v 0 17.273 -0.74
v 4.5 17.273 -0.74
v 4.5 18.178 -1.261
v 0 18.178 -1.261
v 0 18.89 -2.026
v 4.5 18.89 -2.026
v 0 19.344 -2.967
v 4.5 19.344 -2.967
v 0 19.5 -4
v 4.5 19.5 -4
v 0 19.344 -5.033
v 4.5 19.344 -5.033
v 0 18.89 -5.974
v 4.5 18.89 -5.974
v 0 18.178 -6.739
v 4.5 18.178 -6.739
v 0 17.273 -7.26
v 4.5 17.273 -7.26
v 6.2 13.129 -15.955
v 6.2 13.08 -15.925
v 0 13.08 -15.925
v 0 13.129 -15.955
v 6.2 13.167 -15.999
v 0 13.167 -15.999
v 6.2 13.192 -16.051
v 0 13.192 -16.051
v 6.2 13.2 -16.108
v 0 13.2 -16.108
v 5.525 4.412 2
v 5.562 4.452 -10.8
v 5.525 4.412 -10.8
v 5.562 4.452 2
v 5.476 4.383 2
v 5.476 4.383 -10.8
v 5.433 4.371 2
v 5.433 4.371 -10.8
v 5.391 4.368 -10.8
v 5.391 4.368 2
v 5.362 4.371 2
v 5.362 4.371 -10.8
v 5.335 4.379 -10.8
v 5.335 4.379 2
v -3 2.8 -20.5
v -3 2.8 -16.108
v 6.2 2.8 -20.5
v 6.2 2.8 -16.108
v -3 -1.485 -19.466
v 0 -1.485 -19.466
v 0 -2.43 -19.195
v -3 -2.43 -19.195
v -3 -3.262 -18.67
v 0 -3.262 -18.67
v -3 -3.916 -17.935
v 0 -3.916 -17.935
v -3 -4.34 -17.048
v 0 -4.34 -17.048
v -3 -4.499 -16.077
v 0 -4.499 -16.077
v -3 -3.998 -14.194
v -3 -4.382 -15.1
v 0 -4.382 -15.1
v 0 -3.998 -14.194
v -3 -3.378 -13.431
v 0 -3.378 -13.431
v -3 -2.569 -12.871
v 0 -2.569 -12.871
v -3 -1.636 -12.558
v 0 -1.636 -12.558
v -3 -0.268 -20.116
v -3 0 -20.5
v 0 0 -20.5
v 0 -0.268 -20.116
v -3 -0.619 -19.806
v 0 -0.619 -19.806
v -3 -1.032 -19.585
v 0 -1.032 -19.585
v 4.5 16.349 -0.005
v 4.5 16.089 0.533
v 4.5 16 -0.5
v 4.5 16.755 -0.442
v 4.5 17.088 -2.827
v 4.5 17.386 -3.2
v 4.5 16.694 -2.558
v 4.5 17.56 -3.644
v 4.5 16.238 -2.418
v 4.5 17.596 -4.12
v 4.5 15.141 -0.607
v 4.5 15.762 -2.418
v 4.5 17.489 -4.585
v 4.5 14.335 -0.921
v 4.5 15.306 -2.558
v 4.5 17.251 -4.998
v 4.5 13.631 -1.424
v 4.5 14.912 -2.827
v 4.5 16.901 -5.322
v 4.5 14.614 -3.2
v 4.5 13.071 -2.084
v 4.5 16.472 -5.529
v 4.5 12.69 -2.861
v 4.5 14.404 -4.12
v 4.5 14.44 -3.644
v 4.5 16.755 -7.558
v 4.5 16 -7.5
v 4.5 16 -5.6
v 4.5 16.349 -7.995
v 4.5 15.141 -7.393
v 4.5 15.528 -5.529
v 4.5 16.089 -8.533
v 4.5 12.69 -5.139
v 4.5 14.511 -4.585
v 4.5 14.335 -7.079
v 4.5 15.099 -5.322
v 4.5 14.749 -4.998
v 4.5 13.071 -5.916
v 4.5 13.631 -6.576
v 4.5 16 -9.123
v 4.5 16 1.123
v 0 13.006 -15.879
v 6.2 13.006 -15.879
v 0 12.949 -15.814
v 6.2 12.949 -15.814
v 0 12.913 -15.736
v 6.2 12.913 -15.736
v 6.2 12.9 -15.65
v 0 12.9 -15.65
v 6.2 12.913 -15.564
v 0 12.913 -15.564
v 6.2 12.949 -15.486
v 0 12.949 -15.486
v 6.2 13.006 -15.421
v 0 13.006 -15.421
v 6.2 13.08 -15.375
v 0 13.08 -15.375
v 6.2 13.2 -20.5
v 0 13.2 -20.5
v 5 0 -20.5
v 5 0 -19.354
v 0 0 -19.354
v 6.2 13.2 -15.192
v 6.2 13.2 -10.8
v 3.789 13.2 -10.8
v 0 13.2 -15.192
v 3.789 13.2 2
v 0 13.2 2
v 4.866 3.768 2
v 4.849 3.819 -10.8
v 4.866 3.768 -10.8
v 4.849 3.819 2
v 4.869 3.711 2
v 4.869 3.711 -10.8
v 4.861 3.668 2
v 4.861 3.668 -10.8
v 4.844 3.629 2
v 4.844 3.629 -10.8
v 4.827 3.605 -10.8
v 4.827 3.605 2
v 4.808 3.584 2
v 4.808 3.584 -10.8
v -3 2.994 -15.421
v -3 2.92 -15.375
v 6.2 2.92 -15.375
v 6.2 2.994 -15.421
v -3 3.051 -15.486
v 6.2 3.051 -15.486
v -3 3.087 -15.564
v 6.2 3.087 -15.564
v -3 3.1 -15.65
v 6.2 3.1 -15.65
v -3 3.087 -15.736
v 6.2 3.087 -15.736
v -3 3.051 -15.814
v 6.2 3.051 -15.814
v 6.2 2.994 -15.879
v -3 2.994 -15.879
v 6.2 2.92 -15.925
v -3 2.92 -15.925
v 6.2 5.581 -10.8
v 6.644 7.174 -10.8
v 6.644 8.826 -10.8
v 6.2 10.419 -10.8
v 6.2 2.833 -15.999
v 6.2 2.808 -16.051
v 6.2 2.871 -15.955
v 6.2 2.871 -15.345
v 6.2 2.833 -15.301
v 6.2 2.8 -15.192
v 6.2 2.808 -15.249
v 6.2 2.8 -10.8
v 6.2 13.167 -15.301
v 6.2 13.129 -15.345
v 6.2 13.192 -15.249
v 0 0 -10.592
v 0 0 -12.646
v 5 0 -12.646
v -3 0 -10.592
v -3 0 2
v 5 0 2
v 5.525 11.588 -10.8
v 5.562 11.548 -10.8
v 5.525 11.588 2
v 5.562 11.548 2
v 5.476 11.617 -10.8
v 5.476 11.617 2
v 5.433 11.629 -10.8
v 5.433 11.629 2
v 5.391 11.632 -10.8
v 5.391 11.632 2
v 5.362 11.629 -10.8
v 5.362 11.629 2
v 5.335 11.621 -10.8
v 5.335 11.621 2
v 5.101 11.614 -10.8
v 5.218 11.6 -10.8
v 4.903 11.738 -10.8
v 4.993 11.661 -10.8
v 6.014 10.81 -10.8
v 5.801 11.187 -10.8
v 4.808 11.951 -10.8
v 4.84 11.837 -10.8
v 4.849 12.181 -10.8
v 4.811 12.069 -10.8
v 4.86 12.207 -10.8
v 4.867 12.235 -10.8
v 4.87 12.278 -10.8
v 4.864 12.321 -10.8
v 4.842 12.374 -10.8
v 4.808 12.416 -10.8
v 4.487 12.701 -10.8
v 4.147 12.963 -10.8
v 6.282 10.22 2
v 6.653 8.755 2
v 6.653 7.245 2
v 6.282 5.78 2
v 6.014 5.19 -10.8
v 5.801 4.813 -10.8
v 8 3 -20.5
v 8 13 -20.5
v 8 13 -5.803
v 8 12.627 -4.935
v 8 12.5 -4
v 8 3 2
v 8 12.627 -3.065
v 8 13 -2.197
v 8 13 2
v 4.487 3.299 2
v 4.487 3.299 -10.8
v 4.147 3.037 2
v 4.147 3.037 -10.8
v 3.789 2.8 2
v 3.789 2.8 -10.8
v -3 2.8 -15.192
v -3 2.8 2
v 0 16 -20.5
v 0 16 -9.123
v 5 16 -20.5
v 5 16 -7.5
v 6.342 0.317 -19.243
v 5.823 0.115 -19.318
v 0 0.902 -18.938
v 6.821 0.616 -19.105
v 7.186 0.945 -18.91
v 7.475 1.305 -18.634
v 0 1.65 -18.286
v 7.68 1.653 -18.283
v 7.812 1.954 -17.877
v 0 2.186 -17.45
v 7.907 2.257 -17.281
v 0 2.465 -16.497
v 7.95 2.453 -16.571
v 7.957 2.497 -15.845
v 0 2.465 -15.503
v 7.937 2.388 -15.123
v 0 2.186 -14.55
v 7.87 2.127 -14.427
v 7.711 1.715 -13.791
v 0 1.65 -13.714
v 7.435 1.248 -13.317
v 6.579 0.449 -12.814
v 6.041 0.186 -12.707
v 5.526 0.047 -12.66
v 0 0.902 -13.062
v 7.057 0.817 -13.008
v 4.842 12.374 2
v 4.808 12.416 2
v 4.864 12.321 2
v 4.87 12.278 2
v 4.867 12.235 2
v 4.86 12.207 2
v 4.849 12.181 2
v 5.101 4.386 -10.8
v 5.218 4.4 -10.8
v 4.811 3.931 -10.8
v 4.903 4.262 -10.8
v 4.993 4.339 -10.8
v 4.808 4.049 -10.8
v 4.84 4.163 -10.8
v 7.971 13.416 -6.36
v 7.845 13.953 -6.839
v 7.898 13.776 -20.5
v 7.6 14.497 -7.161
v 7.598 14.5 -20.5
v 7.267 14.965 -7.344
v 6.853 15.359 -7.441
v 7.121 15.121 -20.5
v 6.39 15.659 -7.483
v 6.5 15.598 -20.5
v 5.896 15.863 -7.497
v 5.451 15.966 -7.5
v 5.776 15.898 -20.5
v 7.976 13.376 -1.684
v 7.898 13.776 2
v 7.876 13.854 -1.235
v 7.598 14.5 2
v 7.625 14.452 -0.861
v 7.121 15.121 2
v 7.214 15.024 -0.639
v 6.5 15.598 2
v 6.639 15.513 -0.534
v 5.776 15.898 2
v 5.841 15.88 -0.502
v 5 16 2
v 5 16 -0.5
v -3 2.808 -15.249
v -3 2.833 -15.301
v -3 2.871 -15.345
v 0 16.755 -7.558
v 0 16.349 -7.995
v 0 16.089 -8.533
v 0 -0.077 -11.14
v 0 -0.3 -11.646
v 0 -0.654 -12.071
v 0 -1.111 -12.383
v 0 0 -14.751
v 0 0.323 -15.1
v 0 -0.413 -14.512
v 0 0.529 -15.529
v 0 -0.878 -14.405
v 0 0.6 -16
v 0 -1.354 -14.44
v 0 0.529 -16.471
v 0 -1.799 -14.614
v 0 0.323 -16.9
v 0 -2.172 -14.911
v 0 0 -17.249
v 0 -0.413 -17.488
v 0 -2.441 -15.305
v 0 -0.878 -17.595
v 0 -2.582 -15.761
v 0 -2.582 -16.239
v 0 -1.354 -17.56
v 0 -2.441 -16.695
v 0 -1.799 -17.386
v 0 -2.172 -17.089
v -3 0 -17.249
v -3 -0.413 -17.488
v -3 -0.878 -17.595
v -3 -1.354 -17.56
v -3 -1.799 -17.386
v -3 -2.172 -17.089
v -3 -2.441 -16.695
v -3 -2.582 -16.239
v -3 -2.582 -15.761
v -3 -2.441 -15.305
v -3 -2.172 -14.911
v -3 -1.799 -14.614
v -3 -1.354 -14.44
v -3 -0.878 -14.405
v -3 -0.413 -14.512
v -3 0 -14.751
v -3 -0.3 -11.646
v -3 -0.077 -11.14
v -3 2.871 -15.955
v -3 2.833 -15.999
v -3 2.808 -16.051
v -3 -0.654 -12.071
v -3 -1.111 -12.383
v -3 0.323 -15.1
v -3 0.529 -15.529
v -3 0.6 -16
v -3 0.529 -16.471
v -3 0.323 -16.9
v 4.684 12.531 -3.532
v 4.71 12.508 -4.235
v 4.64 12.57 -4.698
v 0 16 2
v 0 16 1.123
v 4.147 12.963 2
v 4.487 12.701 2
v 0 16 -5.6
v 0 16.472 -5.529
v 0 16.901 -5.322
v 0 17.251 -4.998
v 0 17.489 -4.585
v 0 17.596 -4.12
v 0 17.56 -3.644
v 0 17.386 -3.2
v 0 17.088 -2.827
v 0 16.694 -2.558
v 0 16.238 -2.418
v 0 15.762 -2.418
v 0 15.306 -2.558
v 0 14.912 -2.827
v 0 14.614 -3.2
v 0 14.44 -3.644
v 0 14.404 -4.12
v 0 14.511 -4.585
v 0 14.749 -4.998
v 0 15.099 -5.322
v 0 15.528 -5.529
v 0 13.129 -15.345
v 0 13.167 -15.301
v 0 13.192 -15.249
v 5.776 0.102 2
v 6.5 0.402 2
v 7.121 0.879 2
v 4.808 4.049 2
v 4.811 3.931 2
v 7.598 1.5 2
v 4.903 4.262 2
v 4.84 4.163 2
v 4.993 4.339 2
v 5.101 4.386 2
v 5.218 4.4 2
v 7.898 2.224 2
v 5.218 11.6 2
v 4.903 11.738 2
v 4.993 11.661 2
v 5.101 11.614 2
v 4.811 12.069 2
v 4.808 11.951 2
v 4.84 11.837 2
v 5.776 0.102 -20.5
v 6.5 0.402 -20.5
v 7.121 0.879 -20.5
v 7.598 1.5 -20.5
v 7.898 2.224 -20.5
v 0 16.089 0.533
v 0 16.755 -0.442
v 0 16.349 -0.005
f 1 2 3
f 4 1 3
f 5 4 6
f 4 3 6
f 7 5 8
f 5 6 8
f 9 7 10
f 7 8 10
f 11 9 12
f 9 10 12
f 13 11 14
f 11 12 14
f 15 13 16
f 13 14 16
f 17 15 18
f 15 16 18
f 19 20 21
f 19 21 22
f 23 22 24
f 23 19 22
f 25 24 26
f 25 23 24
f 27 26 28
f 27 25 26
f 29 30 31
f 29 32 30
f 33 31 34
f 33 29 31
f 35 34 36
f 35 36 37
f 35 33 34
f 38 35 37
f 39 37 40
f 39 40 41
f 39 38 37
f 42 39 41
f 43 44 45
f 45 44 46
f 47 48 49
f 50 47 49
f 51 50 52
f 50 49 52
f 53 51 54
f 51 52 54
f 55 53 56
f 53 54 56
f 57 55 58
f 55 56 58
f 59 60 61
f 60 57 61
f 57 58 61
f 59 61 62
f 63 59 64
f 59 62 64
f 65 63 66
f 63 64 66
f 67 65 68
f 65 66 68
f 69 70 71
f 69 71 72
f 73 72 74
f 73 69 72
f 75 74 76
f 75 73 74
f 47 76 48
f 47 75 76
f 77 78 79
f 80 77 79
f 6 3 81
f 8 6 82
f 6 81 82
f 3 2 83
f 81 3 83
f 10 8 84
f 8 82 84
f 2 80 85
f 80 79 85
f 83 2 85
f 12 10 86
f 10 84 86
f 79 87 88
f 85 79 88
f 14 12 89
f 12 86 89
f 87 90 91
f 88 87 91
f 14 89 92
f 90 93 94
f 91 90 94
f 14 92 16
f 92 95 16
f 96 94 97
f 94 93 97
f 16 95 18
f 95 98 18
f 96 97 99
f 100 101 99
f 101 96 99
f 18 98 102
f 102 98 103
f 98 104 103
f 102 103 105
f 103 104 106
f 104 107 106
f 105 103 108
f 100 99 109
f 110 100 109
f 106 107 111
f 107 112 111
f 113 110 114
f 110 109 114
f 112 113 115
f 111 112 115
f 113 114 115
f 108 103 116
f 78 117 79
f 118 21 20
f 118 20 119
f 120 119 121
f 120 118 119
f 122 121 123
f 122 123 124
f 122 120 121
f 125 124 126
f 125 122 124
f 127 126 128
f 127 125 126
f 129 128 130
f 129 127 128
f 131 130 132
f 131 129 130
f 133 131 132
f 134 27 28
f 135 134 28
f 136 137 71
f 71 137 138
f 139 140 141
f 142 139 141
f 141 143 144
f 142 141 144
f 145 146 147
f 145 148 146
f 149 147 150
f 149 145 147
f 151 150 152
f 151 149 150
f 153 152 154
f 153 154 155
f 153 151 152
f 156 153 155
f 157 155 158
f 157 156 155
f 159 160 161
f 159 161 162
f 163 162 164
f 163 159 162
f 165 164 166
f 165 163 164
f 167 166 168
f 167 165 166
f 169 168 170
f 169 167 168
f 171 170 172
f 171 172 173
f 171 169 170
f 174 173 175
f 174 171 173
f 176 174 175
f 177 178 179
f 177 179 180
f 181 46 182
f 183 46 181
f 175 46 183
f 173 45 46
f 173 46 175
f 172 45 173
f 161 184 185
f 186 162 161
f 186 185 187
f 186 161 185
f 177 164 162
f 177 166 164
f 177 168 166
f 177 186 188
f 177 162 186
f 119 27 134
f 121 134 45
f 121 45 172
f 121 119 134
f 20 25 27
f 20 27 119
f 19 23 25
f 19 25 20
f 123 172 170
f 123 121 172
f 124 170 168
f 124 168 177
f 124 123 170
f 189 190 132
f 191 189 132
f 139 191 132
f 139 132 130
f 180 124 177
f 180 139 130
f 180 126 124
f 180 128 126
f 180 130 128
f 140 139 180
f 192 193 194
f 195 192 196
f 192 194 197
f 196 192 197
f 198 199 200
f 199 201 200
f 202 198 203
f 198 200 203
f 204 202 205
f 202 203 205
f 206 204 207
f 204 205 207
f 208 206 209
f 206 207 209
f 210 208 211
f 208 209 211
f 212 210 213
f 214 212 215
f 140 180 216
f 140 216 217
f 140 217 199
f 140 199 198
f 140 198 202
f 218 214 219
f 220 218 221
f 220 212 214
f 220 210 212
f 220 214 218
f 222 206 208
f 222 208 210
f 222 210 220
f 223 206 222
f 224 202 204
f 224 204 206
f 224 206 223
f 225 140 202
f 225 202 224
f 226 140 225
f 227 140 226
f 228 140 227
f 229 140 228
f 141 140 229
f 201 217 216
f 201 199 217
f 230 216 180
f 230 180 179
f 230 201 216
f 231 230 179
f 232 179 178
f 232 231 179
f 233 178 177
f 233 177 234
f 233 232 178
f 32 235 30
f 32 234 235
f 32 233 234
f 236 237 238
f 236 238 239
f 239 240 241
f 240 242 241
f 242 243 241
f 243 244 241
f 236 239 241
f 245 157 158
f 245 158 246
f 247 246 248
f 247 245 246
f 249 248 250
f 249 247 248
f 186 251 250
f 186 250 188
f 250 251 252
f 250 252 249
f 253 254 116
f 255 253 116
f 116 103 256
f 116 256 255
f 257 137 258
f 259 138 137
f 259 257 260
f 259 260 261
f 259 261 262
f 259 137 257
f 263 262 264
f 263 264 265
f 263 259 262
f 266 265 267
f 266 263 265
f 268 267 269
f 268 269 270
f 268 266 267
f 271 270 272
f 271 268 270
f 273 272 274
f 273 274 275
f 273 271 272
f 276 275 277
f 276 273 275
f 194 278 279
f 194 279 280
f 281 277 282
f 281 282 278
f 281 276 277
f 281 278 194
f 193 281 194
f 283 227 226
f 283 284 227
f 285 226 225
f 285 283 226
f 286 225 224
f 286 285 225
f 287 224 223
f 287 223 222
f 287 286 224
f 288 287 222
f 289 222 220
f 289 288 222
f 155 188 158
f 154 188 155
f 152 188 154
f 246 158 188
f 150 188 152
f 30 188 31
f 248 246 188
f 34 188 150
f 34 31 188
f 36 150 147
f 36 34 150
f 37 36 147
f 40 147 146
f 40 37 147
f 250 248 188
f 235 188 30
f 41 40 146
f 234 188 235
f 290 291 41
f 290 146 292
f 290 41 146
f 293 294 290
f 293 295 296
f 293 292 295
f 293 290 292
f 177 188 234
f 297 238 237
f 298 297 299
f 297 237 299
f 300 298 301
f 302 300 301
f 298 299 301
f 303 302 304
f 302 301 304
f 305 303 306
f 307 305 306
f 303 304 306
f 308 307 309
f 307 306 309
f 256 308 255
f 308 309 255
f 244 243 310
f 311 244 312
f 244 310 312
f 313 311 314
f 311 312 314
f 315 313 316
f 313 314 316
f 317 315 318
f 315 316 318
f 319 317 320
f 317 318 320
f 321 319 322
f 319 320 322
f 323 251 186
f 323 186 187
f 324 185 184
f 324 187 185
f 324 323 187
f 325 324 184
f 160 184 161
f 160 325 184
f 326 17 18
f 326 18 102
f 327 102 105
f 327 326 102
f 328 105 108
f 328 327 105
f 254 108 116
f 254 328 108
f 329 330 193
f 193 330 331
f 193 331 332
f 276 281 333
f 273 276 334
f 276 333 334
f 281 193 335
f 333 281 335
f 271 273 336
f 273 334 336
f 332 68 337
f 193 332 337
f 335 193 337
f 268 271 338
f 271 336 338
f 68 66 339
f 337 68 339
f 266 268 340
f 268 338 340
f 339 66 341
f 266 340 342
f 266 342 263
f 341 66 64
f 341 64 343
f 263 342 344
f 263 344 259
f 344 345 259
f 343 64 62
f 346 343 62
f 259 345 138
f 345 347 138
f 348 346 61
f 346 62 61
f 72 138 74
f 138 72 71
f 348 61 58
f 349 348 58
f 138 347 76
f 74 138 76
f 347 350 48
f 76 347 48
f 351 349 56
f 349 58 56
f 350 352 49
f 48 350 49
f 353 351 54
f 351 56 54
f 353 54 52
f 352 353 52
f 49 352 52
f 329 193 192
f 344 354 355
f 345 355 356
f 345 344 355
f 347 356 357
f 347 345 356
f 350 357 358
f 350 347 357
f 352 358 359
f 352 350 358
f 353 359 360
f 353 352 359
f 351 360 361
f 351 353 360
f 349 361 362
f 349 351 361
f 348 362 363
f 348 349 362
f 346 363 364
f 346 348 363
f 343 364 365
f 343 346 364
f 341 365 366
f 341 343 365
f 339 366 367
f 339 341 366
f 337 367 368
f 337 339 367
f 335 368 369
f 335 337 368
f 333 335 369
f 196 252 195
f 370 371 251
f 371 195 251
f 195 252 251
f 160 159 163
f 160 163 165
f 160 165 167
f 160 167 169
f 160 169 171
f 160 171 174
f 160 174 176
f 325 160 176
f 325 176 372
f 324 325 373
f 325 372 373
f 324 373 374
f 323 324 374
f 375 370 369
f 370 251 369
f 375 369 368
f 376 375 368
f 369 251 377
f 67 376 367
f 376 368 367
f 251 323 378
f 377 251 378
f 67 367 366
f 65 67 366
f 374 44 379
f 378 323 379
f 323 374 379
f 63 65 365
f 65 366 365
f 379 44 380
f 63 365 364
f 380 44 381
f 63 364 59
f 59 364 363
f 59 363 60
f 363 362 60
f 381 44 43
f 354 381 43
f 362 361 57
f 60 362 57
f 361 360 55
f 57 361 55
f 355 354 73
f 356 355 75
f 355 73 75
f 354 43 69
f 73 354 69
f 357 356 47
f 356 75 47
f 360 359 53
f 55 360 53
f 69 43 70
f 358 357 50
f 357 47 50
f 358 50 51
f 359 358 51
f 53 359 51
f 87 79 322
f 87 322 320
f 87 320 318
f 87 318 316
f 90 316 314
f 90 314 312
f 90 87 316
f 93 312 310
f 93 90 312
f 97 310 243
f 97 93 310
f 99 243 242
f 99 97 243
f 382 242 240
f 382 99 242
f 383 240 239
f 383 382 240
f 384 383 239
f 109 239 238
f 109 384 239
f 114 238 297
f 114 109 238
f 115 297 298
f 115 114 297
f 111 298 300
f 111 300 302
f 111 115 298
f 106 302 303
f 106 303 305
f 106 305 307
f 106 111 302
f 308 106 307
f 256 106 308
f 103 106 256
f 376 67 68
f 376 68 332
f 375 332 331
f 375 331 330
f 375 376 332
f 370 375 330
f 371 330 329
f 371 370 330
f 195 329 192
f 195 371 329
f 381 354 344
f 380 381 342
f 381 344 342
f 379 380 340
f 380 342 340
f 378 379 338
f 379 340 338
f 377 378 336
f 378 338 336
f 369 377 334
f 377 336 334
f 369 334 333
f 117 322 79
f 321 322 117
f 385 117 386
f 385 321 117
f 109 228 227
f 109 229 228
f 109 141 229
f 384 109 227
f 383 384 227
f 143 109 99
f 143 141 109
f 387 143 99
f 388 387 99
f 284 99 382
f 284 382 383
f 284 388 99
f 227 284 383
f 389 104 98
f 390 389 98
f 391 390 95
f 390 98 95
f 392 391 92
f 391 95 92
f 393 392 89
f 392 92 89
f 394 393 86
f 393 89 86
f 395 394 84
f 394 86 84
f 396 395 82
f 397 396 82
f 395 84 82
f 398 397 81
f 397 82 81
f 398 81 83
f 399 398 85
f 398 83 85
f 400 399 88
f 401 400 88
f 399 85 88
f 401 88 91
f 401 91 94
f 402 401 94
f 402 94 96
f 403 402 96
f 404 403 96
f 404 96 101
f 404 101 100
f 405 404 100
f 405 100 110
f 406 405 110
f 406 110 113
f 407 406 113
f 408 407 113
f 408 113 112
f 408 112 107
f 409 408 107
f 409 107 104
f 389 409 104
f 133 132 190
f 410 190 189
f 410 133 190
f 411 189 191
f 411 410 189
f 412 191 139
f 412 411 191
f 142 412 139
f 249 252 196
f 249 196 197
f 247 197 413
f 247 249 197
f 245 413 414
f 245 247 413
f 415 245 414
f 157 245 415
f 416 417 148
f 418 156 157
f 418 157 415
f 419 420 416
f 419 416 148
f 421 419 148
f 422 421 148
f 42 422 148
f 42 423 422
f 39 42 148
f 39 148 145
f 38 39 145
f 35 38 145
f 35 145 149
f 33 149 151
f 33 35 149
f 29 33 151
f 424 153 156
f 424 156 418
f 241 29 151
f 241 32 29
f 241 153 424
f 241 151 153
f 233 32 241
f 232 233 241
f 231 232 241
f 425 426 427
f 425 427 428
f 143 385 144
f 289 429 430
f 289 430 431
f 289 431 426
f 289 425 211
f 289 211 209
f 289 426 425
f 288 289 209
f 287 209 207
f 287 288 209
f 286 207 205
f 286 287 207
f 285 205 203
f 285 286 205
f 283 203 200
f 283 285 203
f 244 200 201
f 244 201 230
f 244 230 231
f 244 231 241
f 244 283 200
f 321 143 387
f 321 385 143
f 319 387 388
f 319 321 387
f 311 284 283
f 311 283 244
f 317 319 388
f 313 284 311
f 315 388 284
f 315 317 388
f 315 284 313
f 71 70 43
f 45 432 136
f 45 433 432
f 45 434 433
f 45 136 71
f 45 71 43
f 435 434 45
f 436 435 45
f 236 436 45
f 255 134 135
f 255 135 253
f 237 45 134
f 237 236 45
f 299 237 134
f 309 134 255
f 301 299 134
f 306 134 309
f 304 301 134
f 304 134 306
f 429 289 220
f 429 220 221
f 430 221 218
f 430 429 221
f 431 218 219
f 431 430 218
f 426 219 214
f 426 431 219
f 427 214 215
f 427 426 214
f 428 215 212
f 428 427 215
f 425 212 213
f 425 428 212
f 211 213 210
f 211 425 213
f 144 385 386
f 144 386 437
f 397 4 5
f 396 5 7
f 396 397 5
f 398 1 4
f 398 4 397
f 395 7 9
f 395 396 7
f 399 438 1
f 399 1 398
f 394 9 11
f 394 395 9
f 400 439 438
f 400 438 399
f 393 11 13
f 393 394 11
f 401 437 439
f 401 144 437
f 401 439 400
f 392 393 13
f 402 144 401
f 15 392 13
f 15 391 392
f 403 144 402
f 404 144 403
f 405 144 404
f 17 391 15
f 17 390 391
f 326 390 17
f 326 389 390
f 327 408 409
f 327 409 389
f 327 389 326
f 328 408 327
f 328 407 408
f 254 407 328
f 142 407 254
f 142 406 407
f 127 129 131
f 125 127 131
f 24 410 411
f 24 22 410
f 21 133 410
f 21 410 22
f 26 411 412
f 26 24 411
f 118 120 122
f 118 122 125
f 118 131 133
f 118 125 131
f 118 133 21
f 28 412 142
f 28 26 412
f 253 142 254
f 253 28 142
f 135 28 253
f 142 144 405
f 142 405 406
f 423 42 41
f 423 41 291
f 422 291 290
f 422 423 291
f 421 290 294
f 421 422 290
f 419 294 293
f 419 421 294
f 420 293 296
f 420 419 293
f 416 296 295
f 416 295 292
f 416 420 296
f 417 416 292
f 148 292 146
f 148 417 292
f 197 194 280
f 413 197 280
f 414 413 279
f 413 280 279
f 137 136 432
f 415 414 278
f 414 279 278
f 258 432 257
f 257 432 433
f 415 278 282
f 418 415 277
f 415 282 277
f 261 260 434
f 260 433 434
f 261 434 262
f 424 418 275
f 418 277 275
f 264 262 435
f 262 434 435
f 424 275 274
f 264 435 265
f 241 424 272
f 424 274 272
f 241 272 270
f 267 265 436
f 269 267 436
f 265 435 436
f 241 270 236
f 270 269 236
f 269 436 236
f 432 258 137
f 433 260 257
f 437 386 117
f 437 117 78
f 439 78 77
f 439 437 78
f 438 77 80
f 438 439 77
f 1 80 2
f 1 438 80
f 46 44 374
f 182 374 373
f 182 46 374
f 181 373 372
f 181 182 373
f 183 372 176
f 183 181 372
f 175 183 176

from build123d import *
from build123d.topology import SkipClean

# Parameters (mm, degrees)
SKETCH_1_W          = 8
SKETCH_1_H          = 20
EXTRUDE_1_DEPTH     = 16
CUT_EXTRUDE_1_REACH = 28.833
SKETCH_2_W          = 6.8
SKETCH_2_H          = 10.4
EXTRUDE_3_DEPTH     = 10.8
CUT_EXTRUDE_2_REACH = 28.833
SKETCH_4_R          = 1.6
EXTRUDE_5_DEPTH     = 3
EXTRUDE_START       = -4.5
SKETCH_5_R          = 1.6
EXTRUDE_4_DEPTH     = 4.5
EXTRUDE_START_2     = -3
SKETCH_7_R          = 3.5
SKETCH_7_R_2        = 1.6
EXTRUDE_6_DEPTH     = 3
CUT_EXTRUDE_3_REACH = 31.056
SKETCH_8_R          = 3.5
EXTRUDE_7_DEPTH     = 0.5
CUT_EXTRUDE_4_REACH = 31.27
SKETCH_10_R         = 3.5
EXTRUDE_START_3     = 2
EXTRUDE_8_DEPTH     = 2
FILLET_1_R          = 2
FILLET_2_R          = 3
SKETCH_12_W         = 9.7
SKETCH_12_H         = 10.4
EXTRUDE_9_DEPTH     = 0.6
SKETCH_13_R         = 0.4
EXTRUDE_10_DEPTH    = 12.8
FILLET_3_R          = 0.2
EXTRUDE_11_REACH    = 32.356
SKETCH_14_R         = 0.3
SKETCH_15_R         = 0.3
CUT_EXTRUDE_5_DEPTH = 3
FILLET_4_R          = 0.2


with BuildPart() as part:
    # 草图1 → 凸台-拉伸1 (new body)
    with BuildSketch(Plane(origin=(0, 0, 0), x_dir=(1, 0, 0), z_dir=(0, 1, 0))):
        with Locations((4, 10)):
            Rectangle(SKETCH_1_W, SKETCH_1_H)
    extrude(amount=EXTRUDE_1_DEPTH)

    # 草图2 → 切除-拉伸1 (cut, up to next)
    with BuildSketch(Plane.XY, mode=Mode.PRIVATE) as cut_extrude_1_sk1:
        with Locations((3.4, 8)):
            Rectangle(SKETCH_2_W, SKETCH_2_H)
    cut_extrude_1_tool1 = extrude(cut_extrude_1_sk1.sketch, amount=-CUT_EXTRUDE_1_REACH, mode=Mode.PRIVATE) & part.part
    add(cut_extrude_1_tool1.solids().sort_by_distance((3.4, 8, 0))[0], mode=Mode.SUBTRACT)

    # 草图3 → 凸台-拉伸3 (add)
    with BuildSketch(Plane.XY):
        with BuildLine():
            Line((3.789043744, 13.2), (6.8, 13.2))
            Line((6.8, 13.2), (6.8, 2.8))
            Line((6.8, 2.8), (3.789043744, 2.8))
            ThreePointArc((3.789043744, 2.8), (6.7, 8), (3.789043744, 13.2))
        make_face()
    extrude(amount=-EXTRUDE_3_DEPTH)

    # 草图4 → 切除-拉伸2 (cut, up to next)
    with BuildSketch(Plane(origin=(8, 0, 0), x_dir=(0, 0, -1), z_dir=(1, 0, 0)), mode=Mode.PRIVATE) as cut_extrude_2_sk1:
        with Locations((4, 16)):
            Circle(SKETCH_4_R)
    cut_extrude_2_tool1 = extrude(cut_extrude_2_sk1.sketch, amount=-CUT_EXTRUDE_2_REACH, mode=Mode.PRIVATE) & part.part
    # 草图4 → 切除-拉伸2 (cut, up to next)
    with BuildSketch(Plane(origin=(8, 0, 0), x_dir=(0, 0, -1), z_dir=(1, 0, 0)), mode=Mode.PRIVATE) as cut_extrude_2_sk2:
        with Locations((16, -1)):
            Circle(SKETCH_4_R)
    cut_extrude_2_tool2 = extrude(cut_extrude_2_sk2.sketch, amount=-CUT_EXTRUDE_2_REACH, mode=Mode.PRIVATE) & part.part
    add(cut_extrude_2_tool1.solids().sort_by_distance((8, 16, -4))[0], mode=Mode.SUBTRACT)
    add(cut_extrude_2_tool2.solids().sort_by_distance((8, -1, -16))[0], mode=Mode.SUBTRACT)

    # 草图6 → 凸台-拉伸5 (add)
    with BuildSketch(Plane.ZY):
        with BuildLine():
            Line((-20, 0), (-17.2489996, 0))
            ThreePointArc((-17.2489996, 0), (-16, 0.6), (-14.7510004, 0))
            Line((-14.7510004, 0), (0, 0))
            Line((0, 0), (0, 2.8))
            Line((0, 2.8), (-20, 2.8))
            Line((-20, 2.8), (-20, 0))
        make_face()
    extrude(amount=EXTRUDE_5_DEPTH)

    # 草图5 → 凸台-拉伸4 (add)
    with BuildSketch(Plane.ZY.offset(EXTRUDE_START)):
        with BuildLine():
            Line((-6.1, 13.2), (-1.9, 13.2))
            ThreePointArc((-1.9, 13.2), (-4, 19.5), (-6.1, 13.2))
        make_face()
        with Locations(Location((-4, 16, 0), (0, 0, 180))):
            Circle(SKETCH_5_R, mode=Mode.SUBTRACT)
    extrude(amount=EXTRUDE_4_DEPTH)

    # 草图7 → 凸台-拉伸6 (add)
    with BuildSketch(Plane.ZY.offset(3).offset(EXTRUDE_START_2)):
        with Locations((-16, -1)):
            Circle(SKETCH_7_R)
        with Locations(Location((-16, -1, 0), (0, 0, 141.317812547))):
            Circle(SKETCH_7_R_2, mode=Mode.SUBTRACT)
    extrude(amount=EXTRUDE_6_DEPTH)

    # 草图8 → 切除-拉伸3 (cut, up to next)
    with BuildSketch(Plane(origin=(0, 0, 0), x_dir=(0, 0, -1), z_dir=(1, 0, 0)), mode=Mode.PRIVATE) as cut_extrude_3_sk1:
        with Locations((16, -1)):
            Circle(SKETCH_8_R)
    cut_extrude_3_tool1 = extrude(cut_extrude_3_sk1.sketch, amount=CUT_EXTRUDE_3_REACH, mode=Mode.PRIVATE) & part.part
    add(cut_extrude_3_tool1.solids().sort_by_distance((0, -1, -16))[0], mode=Mode.SUBTRACT)

    # 草图9 → 凸台-拉伸7 (add)
    with SkipClean():  # the faces are left unmerged after this step: merging them gives an invalid solid
        with BuildSketch(Plane(origin=(0, 0, -20), x_dir=(-1, 0, 0), z_dir=(0, 0, -1))):
            Polygon((-6.8, 2.8), (-6.8, 13.2), (0, 13.2), (0, 16), (-8, 16), (-8, 0), (3, 0), (3, 2.8), align=None)
        extrude(amount=EXTRUDE_7_DEPTH)

    # 草图10 → 切除-拉伸4 (cut, up to next)
    with BuildSketch(Plane(origin=(4.5, 0, 0), x_dir=(0, 0, -1), z_dir=(1, 0, 0)), mode=Mode.PRIVATE) as cut_extrude_4_sk1:
        with Locations((4, 16)):
            Circle(SKETCH_10_R)
    cut_extrude_4_tool1 = extrude(cut_extrude_4_sk1.sketch, amount=CUT_EXTRUDE_4_REACH, mode=Mode.PRIVATE) & part.part
    add(cut_extrude_4_tool1.solids().sort_by_distance((4.5, 16, -4))[0], mode=Mode.SUBTRACT)

    # 草图11 → 凸台-拉伸8 (add)
    with SkipClean():  # the faces are left unmerged after this step: merging them gives an invalid solid
        with BuildSketch(Plane.XY.offset(EXTRUDE_START_3)):
            with BuildLine():
                Line((0, 13.2), (3.789043744, 13.2))
                ThreePointArc((3.789043744, 13.2), (6.7, 8), (3.789043744, 2.8))
                Line((3.789043744, 2.8), (-3, 2.8))
                Line((-3, 2.8), (-3, 0))
                Line((-3, 0), (8, 0))
                Line((8, 0), (8, 16))
                Line((8, 16), (0, 16))
                Line((0, 16), (0, 13.2))
            make_face()
        extrude(amount=-EXTRUDE_8_DEPTH)

    # 圆角1
    # the kernel refuses this fillet: 2 mm, written as the material it adds along each edge
    with BuildSketch(Plane(origin=(-3, 0, -19.354101966), x_dir=(0, 0, -1), z_dir=(1, 0, 0))) as fillet_1_piece_1:
        with BuildLine():
            CenterArc((2.09291543, -1.761578284), FILLET_1_R, 118.262295856, 53.77845338)
            ThreePointArc((0.112181831, -1.484640726), (0.135948895, -0.736286166), (0, 0))
            Line((0, 0), (1.145898034, 0))
        make_face()
    extrude(amount=3)
    with BuildSketch(Plane(origin=(-3, 0, -12.645898034), x_dir=(0, 0, 1), z_dir=(1, 0, 0))) as fillet_1_piece_2:
        with BuildLine():
            CenterArc((2.054224947, 2), FILLET_1_R, 190.475681696, 79.524318304)
            ThreePointArc((0.087560615, 1.636363636), (0.140898096, 0.812985117), (0, 0))
            Line((0, 0), (2.054224947, 0))
        make_face()
    extrude(amount=3)
    with BuildSketch(Plane(origin=(0, 16, -7.5), x_dir=(0, 0, -1), z_dir=(1, 0, 0))) as fillet_1_piece_3:
        with BuildLine():
            CenterArc((1.623475383, 2), FILLET_1_R, 201.323686263, 68.676313737)
            ThreePointArc((-0.239606574, 1.272727273), (-0.06042321, 0.647542667), (0, 0))
            Line((0, 0), (1.623475383, 0))
        make_face()
    extrude(amount=4.5)
    with BuildSketch(Plane(origin=(0, 16, -0.5), x_dir=(0, 0, 1), z_dir=(1, 0, 0))) as fillet_1_piece_4:
        with BuildLine():
            CenterArc((1.623475383, -2), FILLET_1_R, 90, 68.676313737)
            ThreePointArc((-0.239606574, -1.272727273), (-0.06042321, -0.647542667), (0, 0))
            Line((0, 0), (1.623475383, 0))
        make_face()
    extrude(amount=4.5)

    # 圆角2
    # the kernel refuses this fillet: 3 mm, written as the material it takes off along each edge
    with BuildSketch(Plane(origin=(8, 16, -8), x_dir=(-1, 0, 0), z_dir=(0, 0, 1))) as fillet_2_piece_1:
        with BuildLine():
            CenterArc((FILLET_2_R, FILLET_2_R), FILLET_2_R, 180, 90)
            Line((0, FILLET_2_R), (0, 0))
            Line((0, 0), (FILLET_2_R, 0))
        make_face()
    extrude(amount=17.5, mode=Mode.SUBTRACT)
    with BuildSketch(Plane(origin=(8, 0, -11.854101966), x_dir=(0, 1, 0), z_dir=(0, 0, -1))) as fillet_2_piece_2:
        with BuildLine():
            CenterArc((FILLET_2_R, -FILLET_2_R), FILLET_2_R, 90, 90)
            Line((0, -FILLET_2_R), (0, 0))
            Line((0, 0), (FILLET_2_R, 0))
        make_face()
    extrude(amount=16.145898034, mode=Mode.SUBTRACT)
    with BuildSketch(Plane(origin=(8, 16, -28), x_dir=(0, -1, 0), z_dir=(0, 0, 1))) as fillet_2_piece_3:
        with BuildLine():
            CenterArc((FILLET_2_R, -FILLET_2_R), FILLET_2_R, 90, 90)
            Line((0, -FILLET_2_R), (0, 0))
            Line((0, 0), (FILLET_2_R, 0))
        make_face()
    extrude(amount=28, mode=Mode.SUBTRACT)
    with BuildSketch(Plane(origin=(8, 0, -20.145898034), x_dir=(0, 1, 0), z_dir=(0, 0, 1))) as fillet_2_piece_4:
        with BuildLine():
            CenterArc((FILLET_2_R, FILLET_2_R), FILLET_2_R, 180, 90)
            Line((0, FILLET_2_R), (0, 0))
            Line((0, 0), (FILLET_2_R, 0))
        make_face()
    extrude(amount=29.645898034, mode=Mode.SUBTRACT)

    # 草图12 → 凸台-拉伸9 (add)
    with BuildSketch(Plane.ZY.offset(-6.8)):
        with Locations((-15.65, 8)):
            Rectangle(SKETCH_12_W, SKETCH_12_H)
    extrude(amount=EXTRUDE_9_DEPTH)

    # 草图13 → 凸台-拉伸10 (add)
    with BuildSketch(Plane.XY.offset(2)):
        with Locations((5.205431576, 12)):
            Circle(SKETCH_13_R)
        with Locations((5.205431576, 4)):
            Circle(SKETCH_13_R)
    extrude(amount=-EXTRUDE_10_DEPTH)

    # 圆角3
    fillet_3_edges = [part.edges().sort_by_distance(p)[0] for p in [
        (4.933376021, 12.293233311, -5.4),
        (5.457684147, 11.689567011, -5.4),
        (5.457684147, 4.310432989, -5.4),
        (4.933376021, 3.706766689, -5.4),
    ]]
    fillet(fillet_3_edges, radius=FILLET_3_R)

    # 凸台-拉伸11: up to this face of the body (flat: up to its plane)
    extrude_11_end = Plane(part.part.faces().sort_by_distance((6.2, 8, -15.65))[0])
    # 草图14 → 凸台-拉伸11 (add, up to the picked face)
    with BuildSketch(Plane.ZY.offset(3), mode=Mode.PRIVATE) as extrude_11_sk1:
        with Locations((-15.65, 13.2)):
            Circle(SKETCH_14_R)
    extrude_11_tool1 = split(extrude(extrude_11_sk1.sketch, amount=-EXTRUDE_11_REACH, mode=Mode.PRIVATE), bisect_by=extrude_11_end, keep=Keep.BOTH, mode=Mode.PRIVATE)
    # 草图14 → 凸台-拉伸11 (add, up to the picked face)
    with BuildSketch(Plane.ZY.offset(3), mode=Mode.PRIVATE) as extrude_11_sk2:
        with Locations((-15.65, 2.8)):
            Circle(SKETCH_14_R)
    extrude_11_tool2 = split(extrude(extrude_11_sk2.sketch, amount=-EXTRUDE_11_REACH, mode=Mode.PRIVATE), bisect_by=extrude_11_end, keep=Keep.BOTH, mode=Mode.PRIVATE)
    add(extrude_11_tool1.solids().sort_by(Axis((-3, 13.2, -15.65), (1, 0, 0)))[0])
    add(extrude_11_tool2.solids().sort_by(Axis((-3, 2.8, -15.65), (1, 0, 0)))[0])

    # 草图15 → 切除-拉伸5 (cut)
    with BuildSketch(Plane.ZY.offset(3)):
        with Locations((-15.65, 13.2)):
            Circle(SKETCH_15_R)
    extrude(amount=-CUT_EXTRUDE_5_DEPTH, mode=Mode.SUBTRACT)

    # 圆角4
    # the kernel refuses this fillet: 0.2 mm, written as the material it adds along each edge
    with BuildSketch(Plane(origin=(6.595643924, 13.2, -15.95), x_dir=(0, -0.978906312930706, 0.20430964368920726), z_dir=(-1, 0, 0))) as fillet_4_piece_1:
        with BuildLine():
            CenterArc((0.163447715, -0.195781263), FILLET_4_R, 101.789089239, 66.421821522)
            Line((-0.032333548, -0.154919334), (0, 0))
            ThreePointArc((0, 0), (0.061292893, -0.006328106), (0.122585786, 0))
        make_face()
    extrude(amount=6.595643924)
    with BuildSketch(Plane(origin=(0, 13.2, -15.35), x_dir=(0, 0, 1), z_dir=(1, 0, 0))) as fillet_4_piece_2:
        with BuildLine():
            CenterArc((0.158257569, 0.2), FILLET_4_R, 203.578178478, 66.421821522)
            ThreePointArc((-0.025045458, 0.12), (-0.006328106, 0.061292893), (0, 0))
            Line((0, 0), (0.158257569, 0))
        make_face()
    extrude(amount=6.595643924)
    with BuildSketch(Plane(origin=(-3, 2.8, -15.35), x_dir=(0, 0, 1), z_dir=(1, 0, 0))) as fillet_4_piece_3:
        with BuildLine():
            CenterArc((0.158257569, -0.2), FILLET_4_R, 90, 66.421821522)
            ThreePointArc((-0.025045458, -0.12), (-0.006328106, -0.061292893), (0, 0))
            Line((0, 0), (0.158257569, 0))
        make_face()
    extrude(amount=9.595643924)
    with BuildSketch(Plane(origin=(6.595643924, 2.8, -15.95), x_dir=(0, 0.9789063129307064, 0.20430964368920507), z_dir=(-1, 0, 0))) as fillet_4_piece_4:
        with BuildLine():
            CenterArc((0.163447715, 0.195781263), FILLET_4_R, 191.789089239, 66.421821522)
            Line((-0.032333548, 0.154919334), (0, 0))
            ThreePointArc((0, 0), (0.061292893, 0.006328106), (0.122585786, 0))
        make_face()
    extrude(amount=9.595643924)


solid = part.part
